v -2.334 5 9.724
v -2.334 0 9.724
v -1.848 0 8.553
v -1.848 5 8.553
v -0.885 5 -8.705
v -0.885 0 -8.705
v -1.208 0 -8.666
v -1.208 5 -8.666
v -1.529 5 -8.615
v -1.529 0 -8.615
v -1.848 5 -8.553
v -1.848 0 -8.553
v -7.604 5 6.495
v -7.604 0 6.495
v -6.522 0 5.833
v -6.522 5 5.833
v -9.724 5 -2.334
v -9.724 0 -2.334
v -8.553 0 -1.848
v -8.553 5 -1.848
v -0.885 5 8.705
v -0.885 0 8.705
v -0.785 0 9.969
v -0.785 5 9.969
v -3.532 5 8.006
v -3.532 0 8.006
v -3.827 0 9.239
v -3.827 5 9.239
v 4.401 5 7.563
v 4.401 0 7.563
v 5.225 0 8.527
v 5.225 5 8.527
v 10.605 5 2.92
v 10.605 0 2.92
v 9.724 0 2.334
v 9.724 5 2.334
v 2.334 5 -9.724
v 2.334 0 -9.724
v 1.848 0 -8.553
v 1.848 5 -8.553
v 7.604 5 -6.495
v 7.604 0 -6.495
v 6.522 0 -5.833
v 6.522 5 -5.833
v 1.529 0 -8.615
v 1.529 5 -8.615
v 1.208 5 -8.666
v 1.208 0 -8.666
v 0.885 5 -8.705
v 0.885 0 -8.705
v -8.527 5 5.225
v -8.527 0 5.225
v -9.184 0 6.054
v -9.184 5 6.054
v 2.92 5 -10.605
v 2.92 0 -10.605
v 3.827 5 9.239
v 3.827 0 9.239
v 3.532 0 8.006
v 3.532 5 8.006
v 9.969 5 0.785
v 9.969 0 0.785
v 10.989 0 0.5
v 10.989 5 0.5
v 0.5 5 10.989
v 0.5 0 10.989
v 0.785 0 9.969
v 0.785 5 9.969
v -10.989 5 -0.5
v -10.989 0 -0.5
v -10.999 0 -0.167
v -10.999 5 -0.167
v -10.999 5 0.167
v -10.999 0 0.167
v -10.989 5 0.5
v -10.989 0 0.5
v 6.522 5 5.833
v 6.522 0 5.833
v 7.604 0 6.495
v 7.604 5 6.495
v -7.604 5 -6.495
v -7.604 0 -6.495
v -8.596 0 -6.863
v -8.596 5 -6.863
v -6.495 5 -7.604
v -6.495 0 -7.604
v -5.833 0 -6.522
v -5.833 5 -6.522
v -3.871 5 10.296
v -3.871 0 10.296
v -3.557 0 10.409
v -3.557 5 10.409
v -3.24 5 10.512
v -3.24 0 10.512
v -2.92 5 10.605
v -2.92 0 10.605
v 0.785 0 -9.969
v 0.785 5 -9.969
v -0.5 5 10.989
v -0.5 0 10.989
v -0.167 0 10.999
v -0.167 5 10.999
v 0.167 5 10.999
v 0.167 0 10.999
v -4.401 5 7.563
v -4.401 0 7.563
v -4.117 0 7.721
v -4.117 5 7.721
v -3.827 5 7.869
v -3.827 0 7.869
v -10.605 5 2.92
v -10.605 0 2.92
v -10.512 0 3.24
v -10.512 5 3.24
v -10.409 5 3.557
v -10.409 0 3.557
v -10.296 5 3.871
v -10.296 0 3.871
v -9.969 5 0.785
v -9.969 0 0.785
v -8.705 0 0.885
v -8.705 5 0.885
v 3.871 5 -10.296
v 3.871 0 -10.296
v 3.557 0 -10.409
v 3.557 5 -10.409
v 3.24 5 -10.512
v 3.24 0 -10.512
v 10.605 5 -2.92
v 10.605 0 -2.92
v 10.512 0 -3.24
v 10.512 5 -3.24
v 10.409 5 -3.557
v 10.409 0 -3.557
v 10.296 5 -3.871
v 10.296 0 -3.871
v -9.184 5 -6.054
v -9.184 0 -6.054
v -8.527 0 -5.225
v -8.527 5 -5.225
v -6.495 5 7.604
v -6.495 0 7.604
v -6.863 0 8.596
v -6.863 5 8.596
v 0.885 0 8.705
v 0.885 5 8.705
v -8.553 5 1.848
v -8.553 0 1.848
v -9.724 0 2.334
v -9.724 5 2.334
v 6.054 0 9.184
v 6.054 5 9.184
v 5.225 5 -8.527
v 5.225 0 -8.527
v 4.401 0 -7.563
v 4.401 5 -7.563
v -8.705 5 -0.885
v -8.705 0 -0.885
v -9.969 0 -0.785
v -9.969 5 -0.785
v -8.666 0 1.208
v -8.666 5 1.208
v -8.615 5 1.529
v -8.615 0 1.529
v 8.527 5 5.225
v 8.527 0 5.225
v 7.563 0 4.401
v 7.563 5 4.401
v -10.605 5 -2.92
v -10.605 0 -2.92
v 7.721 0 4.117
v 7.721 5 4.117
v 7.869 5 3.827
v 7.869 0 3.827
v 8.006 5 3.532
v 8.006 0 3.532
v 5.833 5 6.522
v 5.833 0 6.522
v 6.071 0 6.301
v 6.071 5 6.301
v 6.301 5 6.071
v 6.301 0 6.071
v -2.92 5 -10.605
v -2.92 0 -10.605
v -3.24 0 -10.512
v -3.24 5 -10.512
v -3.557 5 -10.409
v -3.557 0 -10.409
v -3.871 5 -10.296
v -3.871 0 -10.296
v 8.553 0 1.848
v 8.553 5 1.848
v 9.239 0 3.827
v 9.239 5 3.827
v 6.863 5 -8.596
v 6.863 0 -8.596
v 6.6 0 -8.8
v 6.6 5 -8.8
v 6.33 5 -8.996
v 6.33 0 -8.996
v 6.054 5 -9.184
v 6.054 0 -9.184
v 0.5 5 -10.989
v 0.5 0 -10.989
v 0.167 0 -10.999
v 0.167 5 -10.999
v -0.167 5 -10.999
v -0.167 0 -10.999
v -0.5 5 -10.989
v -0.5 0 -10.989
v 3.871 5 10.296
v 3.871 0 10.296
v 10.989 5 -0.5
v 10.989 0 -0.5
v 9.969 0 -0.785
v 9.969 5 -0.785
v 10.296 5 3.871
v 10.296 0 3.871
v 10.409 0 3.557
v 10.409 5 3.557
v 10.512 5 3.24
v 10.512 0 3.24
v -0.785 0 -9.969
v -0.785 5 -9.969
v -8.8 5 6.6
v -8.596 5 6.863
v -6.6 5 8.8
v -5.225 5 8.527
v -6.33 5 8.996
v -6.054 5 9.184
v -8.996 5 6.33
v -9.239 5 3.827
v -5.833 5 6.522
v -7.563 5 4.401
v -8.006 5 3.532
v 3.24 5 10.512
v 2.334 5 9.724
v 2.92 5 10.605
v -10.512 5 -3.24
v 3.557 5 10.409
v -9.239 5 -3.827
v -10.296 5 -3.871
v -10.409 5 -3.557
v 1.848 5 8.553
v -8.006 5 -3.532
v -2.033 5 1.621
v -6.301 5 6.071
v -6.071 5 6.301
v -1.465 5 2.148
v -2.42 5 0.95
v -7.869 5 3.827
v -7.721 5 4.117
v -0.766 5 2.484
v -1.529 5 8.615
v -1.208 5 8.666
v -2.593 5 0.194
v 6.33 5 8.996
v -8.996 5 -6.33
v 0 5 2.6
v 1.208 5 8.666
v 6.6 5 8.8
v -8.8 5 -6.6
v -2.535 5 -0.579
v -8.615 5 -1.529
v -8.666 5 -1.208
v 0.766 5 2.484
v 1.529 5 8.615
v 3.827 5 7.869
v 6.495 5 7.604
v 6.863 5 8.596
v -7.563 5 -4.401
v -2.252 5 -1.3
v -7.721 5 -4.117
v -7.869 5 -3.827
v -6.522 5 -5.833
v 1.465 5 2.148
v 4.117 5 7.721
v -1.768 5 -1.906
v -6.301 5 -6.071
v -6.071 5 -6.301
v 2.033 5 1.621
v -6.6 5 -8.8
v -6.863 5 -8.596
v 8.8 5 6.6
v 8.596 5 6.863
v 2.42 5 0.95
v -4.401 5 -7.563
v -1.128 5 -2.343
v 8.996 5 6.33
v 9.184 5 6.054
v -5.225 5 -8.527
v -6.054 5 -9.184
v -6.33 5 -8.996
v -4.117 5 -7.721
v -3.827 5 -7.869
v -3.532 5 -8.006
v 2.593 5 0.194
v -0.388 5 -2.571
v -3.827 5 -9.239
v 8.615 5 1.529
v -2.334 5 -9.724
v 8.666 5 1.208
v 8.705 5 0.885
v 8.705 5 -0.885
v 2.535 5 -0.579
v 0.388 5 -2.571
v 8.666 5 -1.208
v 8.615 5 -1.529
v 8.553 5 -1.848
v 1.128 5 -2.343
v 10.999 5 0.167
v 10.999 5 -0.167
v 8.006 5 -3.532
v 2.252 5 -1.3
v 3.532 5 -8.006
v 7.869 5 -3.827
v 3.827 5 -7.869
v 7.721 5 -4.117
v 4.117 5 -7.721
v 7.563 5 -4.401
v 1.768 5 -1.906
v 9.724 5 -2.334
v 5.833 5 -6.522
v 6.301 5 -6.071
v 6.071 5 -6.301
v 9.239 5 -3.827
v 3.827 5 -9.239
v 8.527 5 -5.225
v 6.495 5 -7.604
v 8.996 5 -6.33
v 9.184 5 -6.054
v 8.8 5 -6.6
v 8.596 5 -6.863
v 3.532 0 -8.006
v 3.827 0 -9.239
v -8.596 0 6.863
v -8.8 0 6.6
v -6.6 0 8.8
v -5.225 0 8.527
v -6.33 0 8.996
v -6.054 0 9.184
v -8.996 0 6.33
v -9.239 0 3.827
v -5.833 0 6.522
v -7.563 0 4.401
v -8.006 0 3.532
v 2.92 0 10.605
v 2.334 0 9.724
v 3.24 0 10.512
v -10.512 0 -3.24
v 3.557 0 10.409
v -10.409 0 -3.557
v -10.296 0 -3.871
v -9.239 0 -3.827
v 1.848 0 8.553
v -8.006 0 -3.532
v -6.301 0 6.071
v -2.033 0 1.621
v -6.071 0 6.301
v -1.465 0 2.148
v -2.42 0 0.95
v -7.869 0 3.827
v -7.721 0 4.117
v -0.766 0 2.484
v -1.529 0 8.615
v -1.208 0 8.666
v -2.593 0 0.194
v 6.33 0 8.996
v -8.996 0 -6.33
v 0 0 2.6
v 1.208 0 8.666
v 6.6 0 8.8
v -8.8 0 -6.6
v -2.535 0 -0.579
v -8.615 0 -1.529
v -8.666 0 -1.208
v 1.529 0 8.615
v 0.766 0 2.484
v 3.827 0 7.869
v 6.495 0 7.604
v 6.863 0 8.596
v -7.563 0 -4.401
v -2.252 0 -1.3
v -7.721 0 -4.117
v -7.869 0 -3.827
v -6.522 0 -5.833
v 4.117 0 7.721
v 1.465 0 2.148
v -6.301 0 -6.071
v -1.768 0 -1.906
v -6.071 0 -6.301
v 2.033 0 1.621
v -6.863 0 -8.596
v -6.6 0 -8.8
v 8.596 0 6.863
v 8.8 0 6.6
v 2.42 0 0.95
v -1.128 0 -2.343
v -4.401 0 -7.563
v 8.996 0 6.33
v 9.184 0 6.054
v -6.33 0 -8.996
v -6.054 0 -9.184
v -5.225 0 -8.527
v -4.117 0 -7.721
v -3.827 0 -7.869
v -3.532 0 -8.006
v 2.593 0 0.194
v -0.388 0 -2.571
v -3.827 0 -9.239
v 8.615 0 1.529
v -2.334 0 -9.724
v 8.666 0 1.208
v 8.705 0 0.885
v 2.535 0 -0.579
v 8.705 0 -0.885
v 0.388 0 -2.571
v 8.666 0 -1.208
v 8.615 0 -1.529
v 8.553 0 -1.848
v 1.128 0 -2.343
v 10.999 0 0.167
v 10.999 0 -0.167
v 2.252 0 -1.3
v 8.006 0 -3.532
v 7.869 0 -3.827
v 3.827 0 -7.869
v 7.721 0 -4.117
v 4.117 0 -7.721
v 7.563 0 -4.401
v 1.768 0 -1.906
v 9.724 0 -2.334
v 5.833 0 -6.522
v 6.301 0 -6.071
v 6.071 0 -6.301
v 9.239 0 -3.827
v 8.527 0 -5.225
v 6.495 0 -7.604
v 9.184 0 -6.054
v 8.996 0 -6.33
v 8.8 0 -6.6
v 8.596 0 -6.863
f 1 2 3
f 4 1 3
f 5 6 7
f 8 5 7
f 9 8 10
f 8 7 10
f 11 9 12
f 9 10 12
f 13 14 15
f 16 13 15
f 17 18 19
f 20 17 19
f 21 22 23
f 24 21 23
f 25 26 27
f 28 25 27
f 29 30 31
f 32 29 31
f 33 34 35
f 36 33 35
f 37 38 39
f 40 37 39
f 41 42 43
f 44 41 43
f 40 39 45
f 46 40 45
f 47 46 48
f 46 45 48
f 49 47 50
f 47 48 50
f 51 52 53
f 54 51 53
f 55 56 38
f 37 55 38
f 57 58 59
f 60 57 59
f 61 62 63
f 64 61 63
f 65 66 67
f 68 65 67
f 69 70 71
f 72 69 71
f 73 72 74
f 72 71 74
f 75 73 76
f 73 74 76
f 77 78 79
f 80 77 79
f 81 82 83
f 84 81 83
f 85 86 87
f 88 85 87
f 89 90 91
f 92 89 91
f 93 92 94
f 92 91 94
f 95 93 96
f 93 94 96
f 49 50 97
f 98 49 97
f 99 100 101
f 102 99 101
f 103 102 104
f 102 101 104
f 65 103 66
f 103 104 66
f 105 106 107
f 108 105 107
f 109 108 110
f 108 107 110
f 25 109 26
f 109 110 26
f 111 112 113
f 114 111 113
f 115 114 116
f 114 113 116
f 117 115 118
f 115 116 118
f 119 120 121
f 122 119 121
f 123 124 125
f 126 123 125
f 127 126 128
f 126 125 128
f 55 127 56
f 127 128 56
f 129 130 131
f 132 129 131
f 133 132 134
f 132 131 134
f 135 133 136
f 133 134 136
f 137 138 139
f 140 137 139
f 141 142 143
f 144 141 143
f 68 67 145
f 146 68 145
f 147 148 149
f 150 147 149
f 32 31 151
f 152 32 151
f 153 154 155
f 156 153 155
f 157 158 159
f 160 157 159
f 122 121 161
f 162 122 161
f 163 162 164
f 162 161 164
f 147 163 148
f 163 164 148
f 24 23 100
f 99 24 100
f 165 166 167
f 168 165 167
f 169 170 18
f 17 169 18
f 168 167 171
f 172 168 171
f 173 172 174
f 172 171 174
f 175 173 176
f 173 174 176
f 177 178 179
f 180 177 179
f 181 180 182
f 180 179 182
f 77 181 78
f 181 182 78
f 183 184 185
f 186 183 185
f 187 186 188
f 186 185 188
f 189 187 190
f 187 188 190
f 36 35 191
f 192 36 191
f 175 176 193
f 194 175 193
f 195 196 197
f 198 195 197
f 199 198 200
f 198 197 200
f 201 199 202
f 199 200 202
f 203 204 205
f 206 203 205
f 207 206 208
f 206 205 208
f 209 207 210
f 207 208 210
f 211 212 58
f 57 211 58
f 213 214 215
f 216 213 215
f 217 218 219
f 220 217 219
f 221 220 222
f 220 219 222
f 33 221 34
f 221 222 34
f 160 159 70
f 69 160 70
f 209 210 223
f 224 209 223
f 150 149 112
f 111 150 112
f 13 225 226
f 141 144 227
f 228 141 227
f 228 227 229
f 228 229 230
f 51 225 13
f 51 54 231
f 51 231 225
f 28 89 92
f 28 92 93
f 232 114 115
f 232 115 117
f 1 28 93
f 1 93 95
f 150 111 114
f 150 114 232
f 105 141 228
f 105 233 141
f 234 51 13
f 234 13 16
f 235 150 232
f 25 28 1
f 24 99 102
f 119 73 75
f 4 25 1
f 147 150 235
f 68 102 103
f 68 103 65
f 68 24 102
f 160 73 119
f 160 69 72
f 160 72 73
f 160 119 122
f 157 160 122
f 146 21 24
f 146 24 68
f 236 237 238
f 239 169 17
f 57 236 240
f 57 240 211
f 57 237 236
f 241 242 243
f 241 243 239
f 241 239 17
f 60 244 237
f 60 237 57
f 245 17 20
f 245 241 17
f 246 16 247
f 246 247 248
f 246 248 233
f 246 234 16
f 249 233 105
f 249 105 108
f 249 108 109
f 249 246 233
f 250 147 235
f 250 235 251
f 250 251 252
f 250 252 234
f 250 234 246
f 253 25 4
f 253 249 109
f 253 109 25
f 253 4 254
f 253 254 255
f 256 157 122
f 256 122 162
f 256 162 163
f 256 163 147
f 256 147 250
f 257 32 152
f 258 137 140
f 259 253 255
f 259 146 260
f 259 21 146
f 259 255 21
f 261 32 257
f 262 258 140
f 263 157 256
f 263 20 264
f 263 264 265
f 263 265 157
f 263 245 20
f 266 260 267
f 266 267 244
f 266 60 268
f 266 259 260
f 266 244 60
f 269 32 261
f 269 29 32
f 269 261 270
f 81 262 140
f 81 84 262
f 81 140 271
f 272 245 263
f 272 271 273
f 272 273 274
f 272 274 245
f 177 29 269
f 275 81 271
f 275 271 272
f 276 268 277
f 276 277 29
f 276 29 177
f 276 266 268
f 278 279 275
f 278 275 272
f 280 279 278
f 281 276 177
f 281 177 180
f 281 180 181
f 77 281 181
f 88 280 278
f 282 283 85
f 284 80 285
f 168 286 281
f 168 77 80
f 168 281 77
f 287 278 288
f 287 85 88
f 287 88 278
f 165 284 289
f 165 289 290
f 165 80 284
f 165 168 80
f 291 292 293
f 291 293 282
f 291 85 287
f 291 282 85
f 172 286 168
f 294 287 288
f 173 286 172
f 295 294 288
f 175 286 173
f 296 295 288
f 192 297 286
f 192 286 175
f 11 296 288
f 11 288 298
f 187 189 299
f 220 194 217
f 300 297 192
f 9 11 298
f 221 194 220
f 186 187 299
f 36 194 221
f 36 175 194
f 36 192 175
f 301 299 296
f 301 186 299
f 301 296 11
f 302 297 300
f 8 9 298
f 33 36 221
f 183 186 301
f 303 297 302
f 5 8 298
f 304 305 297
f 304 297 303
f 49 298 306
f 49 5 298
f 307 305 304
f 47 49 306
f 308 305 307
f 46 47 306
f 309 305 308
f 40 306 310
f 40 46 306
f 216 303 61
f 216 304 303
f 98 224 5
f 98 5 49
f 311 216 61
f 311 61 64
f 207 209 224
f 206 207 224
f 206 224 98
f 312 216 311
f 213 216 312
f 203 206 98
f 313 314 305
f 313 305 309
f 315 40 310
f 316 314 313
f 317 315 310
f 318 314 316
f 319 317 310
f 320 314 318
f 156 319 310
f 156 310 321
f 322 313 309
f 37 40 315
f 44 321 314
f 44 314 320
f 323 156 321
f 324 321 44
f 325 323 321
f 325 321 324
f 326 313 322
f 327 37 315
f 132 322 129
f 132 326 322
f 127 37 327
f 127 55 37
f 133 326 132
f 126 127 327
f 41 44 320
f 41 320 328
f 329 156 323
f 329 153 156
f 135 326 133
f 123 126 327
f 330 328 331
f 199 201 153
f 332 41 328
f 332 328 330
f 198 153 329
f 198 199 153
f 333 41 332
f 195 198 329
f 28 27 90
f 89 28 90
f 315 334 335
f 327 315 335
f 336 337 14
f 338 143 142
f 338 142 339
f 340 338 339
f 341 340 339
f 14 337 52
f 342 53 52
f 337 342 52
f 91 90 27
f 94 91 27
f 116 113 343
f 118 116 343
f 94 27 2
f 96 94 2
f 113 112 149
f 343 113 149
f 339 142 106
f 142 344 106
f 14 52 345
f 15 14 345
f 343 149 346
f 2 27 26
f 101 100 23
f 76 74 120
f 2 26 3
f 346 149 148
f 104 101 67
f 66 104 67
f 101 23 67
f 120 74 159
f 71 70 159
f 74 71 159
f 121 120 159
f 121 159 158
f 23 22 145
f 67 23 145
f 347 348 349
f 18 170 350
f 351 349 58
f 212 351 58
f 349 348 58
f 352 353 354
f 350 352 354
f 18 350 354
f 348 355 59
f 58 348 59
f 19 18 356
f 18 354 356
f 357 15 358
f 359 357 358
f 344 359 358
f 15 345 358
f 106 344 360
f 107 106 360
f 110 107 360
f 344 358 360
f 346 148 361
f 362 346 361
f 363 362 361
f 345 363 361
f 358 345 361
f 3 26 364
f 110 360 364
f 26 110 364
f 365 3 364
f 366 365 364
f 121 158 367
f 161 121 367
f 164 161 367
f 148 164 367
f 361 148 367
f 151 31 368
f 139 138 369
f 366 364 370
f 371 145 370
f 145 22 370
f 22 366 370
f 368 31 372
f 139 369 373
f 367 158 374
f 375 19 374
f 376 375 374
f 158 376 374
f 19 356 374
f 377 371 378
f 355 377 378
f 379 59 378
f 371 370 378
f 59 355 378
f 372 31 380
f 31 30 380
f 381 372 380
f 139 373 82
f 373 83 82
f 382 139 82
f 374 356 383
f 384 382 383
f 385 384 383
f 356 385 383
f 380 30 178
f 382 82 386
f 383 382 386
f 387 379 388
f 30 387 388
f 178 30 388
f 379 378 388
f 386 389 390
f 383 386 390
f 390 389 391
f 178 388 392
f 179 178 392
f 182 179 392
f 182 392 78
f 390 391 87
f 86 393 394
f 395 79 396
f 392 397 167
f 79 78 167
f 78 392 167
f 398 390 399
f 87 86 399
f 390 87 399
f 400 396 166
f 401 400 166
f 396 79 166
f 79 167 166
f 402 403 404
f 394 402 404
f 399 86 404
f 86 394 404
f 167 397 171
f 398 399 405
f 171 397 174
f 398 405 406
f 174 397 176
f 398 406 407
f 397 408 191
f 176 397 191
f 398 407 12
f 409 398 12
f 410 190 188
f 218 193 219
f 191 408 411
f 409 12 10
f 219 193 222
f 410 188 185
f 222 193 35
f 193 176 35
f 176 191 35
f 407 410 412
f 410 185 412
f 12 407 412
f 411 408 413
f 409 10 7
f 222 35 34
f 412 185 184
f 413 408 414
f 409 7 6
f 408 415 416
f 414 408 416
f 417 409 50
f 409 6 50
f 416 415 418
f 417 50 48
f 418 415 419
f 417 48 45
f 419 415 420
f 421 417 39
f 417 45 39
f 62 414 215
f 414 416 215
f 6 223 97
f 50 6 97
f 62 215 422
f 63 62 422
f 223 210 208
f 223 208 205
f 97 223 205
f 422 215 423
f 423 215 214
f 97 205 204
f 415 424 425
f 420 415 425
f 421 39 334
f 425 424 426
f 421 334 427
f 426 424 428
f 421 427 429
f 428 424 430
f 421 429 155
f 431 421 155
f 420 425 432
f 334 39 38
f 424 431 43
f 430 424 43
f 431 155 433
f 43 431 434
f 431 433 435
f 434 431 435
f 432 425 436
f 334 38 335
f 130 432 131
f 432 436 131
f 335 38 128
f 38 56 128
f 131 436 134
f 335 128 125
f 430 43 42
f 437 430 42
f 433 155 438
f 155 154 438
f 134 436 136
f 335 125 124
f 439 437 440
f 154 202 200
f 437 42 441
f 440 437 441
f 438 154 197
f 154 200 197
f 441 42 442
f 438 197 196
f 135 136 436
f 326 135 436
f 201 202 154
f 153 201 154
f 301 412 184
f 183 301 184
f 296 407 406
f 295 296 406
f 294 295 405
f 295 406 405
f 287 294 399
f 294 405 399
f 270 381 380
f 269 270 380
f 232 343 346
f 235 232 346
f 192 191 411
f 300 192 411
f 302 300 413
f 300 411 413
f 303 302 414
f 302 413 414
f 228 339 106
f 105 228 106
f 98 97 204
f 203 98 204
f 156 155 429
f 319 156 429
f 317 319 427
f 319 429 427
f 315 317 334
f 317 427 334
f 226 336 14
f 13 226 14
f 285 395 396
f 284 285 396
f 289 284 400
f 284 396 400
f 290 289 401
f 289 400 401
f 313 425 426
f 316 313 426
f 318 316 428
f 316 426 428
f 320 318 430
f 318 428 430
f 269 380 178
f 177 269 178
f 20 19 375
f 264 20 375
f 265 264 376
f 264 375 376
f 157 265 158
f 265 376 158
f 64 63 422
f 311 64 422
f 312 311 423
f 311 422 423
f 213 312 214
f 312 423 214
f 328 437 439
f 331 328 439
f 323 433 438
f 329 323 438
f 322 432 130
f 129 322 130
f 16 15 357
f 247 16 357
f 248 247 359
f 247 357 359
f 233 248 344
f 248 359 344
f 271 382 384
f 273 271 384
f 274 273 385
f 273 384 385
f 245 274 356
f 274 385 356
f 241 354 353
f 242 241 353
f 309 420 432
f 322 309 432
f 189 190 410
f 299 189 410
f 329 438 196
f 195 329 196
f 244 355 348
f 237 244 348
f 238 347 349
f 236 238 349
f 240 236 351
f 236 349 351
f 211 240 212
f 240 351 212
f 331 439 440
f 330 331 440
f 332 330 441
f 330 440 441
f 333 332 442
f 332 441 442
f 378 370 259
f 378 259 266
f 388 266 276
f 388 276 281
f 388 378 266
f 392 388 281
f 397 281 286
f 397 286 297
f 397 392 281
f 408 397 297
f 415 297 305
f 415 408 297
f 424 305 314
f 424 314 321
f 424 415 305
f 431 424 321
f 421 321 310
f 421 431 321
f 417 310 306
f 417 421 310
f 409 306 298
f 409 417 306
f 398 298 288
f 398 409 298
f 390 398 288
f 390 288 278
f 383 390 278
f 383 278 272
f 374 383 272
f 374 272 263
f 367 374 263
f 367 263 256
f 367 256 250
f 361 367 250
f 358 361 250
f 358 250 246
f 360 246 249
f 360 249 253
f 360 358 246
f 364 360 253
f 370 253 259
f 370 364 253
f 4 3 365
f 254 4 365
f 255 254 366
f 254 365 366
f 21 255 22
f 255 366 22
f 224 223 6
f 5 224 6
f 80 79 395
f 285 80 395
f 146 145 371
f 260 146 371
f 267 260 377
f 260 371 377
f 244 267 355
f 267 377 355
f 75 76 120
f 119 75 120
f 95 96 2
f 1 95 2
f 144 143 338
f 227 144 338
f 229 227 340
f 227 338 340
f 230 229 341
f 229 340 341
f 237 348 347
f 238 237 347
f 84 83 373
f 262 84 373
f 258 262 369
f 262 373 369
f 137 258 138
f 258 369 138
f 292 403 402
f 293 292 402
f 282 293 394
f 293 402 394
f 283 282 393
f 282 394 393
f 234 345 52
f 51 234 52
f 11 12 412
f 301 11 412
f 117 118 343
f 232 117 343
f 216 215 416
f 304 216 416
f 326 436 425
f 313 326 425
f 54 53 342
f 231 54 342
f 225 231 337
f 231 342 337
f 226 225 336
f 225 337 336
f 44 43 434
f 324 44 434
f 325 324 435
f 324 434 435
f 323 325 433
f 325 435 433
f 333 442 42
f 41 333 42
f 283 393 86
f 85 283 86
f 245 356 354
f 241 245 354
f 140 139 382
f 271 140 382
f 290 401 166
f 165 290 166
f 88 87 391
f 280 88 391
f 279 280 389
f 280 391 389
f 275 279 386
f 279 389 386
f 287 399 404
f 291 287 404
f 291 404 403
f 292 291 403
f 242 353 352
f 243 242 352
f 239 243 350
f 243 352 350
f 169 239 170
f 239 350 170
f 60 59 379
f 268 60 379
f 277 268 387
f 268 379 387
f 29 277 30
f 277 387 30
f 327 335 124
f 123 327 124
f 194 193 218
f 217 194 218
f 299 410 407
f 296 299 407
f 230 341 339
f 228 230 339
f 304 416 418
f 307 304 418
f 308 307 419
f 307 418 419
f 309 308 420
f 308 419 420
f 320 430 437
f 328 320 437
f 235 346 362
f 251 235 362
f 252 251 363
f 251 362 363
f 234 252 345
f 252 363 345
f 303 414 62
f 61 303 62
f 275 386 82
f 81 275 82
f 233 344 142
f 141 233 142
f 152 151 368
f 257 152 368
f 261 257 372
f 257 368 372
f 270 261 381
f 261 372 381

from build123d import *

# Parameters (mm, degrees)
SKETCH1_R           = 2.6
BOSS_EXTRUDE1_DEPTH = 5


with BuildPart() as part:
    # Sketch1 → Boss-Extrude1 (new body)
    with BuildSketch(Plane(origin=(0, 0, 0), x_dir=(1, 0, 0), z_dir=(0, 1, 0))):
        with BuildLine():
            Line((0.885, 8.705129235), (0.785, 9.969141137))
            Line((0.785, 9.969141137), (0.5, 10.988630488))
            ThreePointArc((0.5, 10.988630488), (0, 11), (-0.5, 10.988630488))
            Line((-0.5, 10.988630488), (-0.785, 9.969141137))
            Line((-0.785, 9.969141137), (-0.885, 8.705129235))
            ThreePointArc((-0.885, 8.705129235), (-1.368801569, 8.64227298), (-1.848347855, 8.552549924))
            Line((-1.848347855, 8.552549924), (-2.334054665, 9.72379498))
            Line((-2.334054665, 9.72379498), (-2.920145308, 10.605317128))
            ThreePointArc((-2.920145308, 10.605317128), (-3.399186938, 10.461621679), (-3.871201824, 10.296300134))
            Line((-3.871201824, 10.296300134), (-3.827213396, 9.238638299))
            Line((-3.827213396, 9.238638299), (-3.531717889, 8.005589844))
            ThreePointArc((-3.531717889, 8.005589844), (-3.972416873, 7.796307087), (-4.400766544, 7.562787438))
            Line((-4.400766544, 7.562787438), (-5.224635797, 8.526616022))
            Line((-5.224635797, 8.526616022), (-6.054446447, 9.183881436))
            ThreePointArc((-6.054446447, 9.183881436), (-6.465637775, 8.899186938), (-6.863463441, 8.596096183))
            Line((-6.863463441, 8.596096183), (-6.494792479, 7.603793176))
            Line((-6.494792479, 7.603793176), (-5.832726624, 6.522407541))
            ThreePointArc((-5.832726624, 6.522407541), (-6.187184335, 6.187184335), (-6.522407541, 5.832726624))
            Line((-6.522407541, 5.832726624), (-7.603793176, 6.494792479))
            Line((-7.603793176, 6.494792479), (-8.596096183, 6.863463441))
            ThreePointArc((-8.596096183, 6.863463441), (-8.899186938, 6.465637775), (-9.183881436, 6.054446447))
            Line((-9.183881436, 6.054446447), (-8.526616022, 5.224635797))
            Line((-8.526616022, 5.224635797), (-7.562787438, 4.400766544))
            ThreePointArc((-7.562787438, 4.400766544), (-7.796307087, 3.972416873), (-8.005589844, 3.531717889))
            Line((-8.005589844, 3.531717889), (-9.238638299, 3.827213396))
            Line((-9.238638299, 3.827213396), (-10.296300134, 3.871201824))
            ThreePointArc((-10.296300134, 3.871201824), (-10.461621679, 3.399186938), (-10.605317128, 2.920145308))
            Line((-10.605317128, 2.920145308), (-9.72379498, 2.334054665))
            Line((-9.72379498, 2.334054665), (-8.552549924, 1.848347855))
            ThreePointArc((-8.552549924, 1.848347855), (-8.64227298, 1.368801569), (-8.705129235, 0.885))
            Line((-8.705129235, 0.885), (-9.969141137, 0.785))
            Line((-9.969141137, 0.785), (-10.988630488, 0.5))
            ThreePointArc((-10.988630488, 0.5), (-11, 0), (-10.988630488, -0.5))
            Line((-10.988630488, -0.5), (-9.969141137, -0.785))
            Line((-9.969141137, -0.785), (-8.705129235, -0.885))
            ThreePointArc((-8.705129235, -0.885), (-8.64227298, -1.368801569), (-8.552549924, -1.848347855))
            Line((-8.552549924, -1.848347855), (-9.72379498, -2.334054665))
            Line((-9.72379498, -2.334054665), (-10.605317128, -2.920145308))
            ThreePointArc((-10.605317128, -2.920145308), (-10.461621679, -3.399186938), (-10.296300134, -3.871201824))
            Line((-10.296300134, -3.871201824), (-9.238638299, -3.827213396))
            Line((-9.238638299, -3.827213396), (-8.005589844, -3.531717889))
            ThreePointArc((-8.005589844, -3.531717889), (-7.796307087, -3.972416873), (-7.562787438, -4.400766544))
            Line((-7.562787438, -4.400766544), (-8.526616022, -5.224635797))
            Line((-8.526616022, -5.224635797), (-9.183881436, -6.054446447))
            ThreePointArc((-9.183881436, -6.054446447), (-8.899186938, -6.465637775), (-8.596096183, -6.863463441))
            Line((-8.596096183, -6.863463441), (-7.603793176, -6.494792479))
            Line((-7.603793176, -6.494792479), (-6.522407541, -5.832726624))
            ThreePointArc((-6.522407541, -5.832726624), (-6.187184335, -6.187184335), (-5.832726624, -6.522407541))
            Line((-5.832726624, -6.522407541), (-6.494792479, -7.603793176))
            Line((-6.494792479, -7.603793176), (-6.863463441, -8.596096183))
            ThreePointArc((-6.863463441, -8.596096183), (-6.465637775, -8.899186938), (-6.054446447, -9.183881436))
            Line((-6.054446447, -9.183881436), (-5.224635797, -8.526616022))
            Line((-5.224635797, -8.526616022), (-4.400766544, -7.562787438))
            ThreePointArc((-4.400766544, -7.562787438), (-3.972416873, -7.796307087), (-3.531717889, -8.005589844))
            Line((-3.531717889, -8.005589844), (-3.827213396, -9.238638299))
            Line((-3.827213396, -9.238638299), (-3.871201824, -10.296300134))
            ThreePointArc((-3.871201824, -10.296300134), (-3.399186938, -10.461621679), (-2.920145308, -10.605317128))
            Line((-2.920145308, -10.605317128), (-2.334054665, -9.72379498))
            Line((-2.334054665, -9.72379498), (-1.848347855, -8.552549924))
            ThreePointArc((-1.848347855, -8.552549924), (-1.368801569, -8.64227298), (-0.885, -8.705129235))
            Line((-0.885, -8.705129235), (-0.785, -9.969141137))
            Line((-0.785, -9.969141137), (-0.5, -10.988630488))
            ThreePointArc((-0.5, -10.988630488), (0, -11), (0.5, -10.988630488))
            Line((0.5, -10.988630488), (0.785, -9.969141137))
            Line((0.785, -9.969141137), (0.885, -8.705129235))
            ThreePointArc((0.885, -8.705129235), (1.368801569, -8.64227298), (1.848347855, -8.552549924))
            Line((1.848347855, -8.552549924), (2.334054665, -9.72379498))
            Line((2.334054665, -9.72379498), (2.920145308, -10.605317128))
            ThreePointArc((2.920145308, -10.605317128), (3.399186938, -10.461621679), (3.871201824, -10.296300134))
            Line((3.871201824, -10.296300134), (3.827213396, -9.238638299))
            Line((3.827213396, -9.238638299), (3.531717889, -8.005589844))
            ThreePointArc((3.531717889, -8.005589844), (3.972416873, -7.796307087), (4.400766544, -7.562787438))
            Line((4.400766544, -7.562787438), (5.224635797, -8.526616022))
            Line((5.224635797, -8.526616022), (6.054446447, -9.183881436))
            ThreePointArc((6.054446447, -9.183881436), (6.465637775, -8.899186938), (6.863463441, -8.596096183))
            Line((6.863463441, -8.596096183), (6.494792479, -7.603793176))
            Line((6.494792479, -7.603793176), (5.832726624, -6.522407541))
            ThreePointArc((5.832726624, -6.522407541), (6.187184335, -6.187184335), (6.522407541, -5.832726624))
            Line((6.522407541, -5.832726624), (7.603793176, -6.494792479))
            Line((7.603793176, -6.494792479), (8.596096183, -6.863463441))
            ThreePointArc((8.596096183, -6.863463441), (8.899186938, -6.465637775), (9.183881436, -6.054446447))
            Line((9.183881436, -6.054446447), (8.526616022, -5.224635797))
            Line((8.526616022, -5.224635797), (7.562787438, -4.400766544))
            ThreePointArc((7.562787438, -4.400766544), (7.796307087, -3.972416873), (8.005589844, -3.531717889))
            Line((8.005589844, -3.531717889), (9.238638299, -3.827213396))
            Line((9.238638299, -3.827213396), (10.296300134, -3.871201824))
            ThreePointArc((10.296300134, -3.871201824), (10.461621679, -3.399186938), (10.605317128, -2.920145308))
            Line((10.605317128, -2.920145308), (9.72379498, -2.334054665))
            Line((9.72379498, -2.334054665), (8.552549924, -1.848347855))
            ThreePointArc((8.552549924, -1.848347855), (8.64227298, -1.368801569), (8.705129235, -0.885))
            Line((8.705129235, -0.885), (9.969141137, -0.785))
            Line((9.969141137, -0.785), (10.988630488, -0.5))
            ThreePointArc((10.988630488, -0.5), (11, 0), (10.988630488, 0.5))
            Line((10.988630488, 0.5), (9.969141137, 0.785))
            Line((9.969141137, 0.785), (8.705129235, 0.885))
            ThreePointArc((8.705129235, 0.885), (8.64227298, 1.368801569), (8.552549924, 1.848347855))
            Line((8.552549924, 1.848347855), (9.72379498, 2.334054665))
            Line((9.72379498, 2.334054665), (10.605317128, 2.920145308))
            ThreePointArc((10.605317128, 2.920145308), (10.461621679, 3.399186938), (10.296300134, 3.871201824))
            Line((10.296300134, 3.871201824), (9.238638299, 3.827213396))
            Line((9.238638299, 3.827213396), (8.005589844, 3.531717889))
            ThreePointArc((8.005589844, 3.531717889), (7.796307087, 3.972416873), (7.562787438, 4.400766544))
            Line((7.562787438, 4.400766544), (8.526616022, 5.224635797))
            Line((8.526616022, 5.224635797), (9.183881436, 6.054446447))
            ThreePointArc((9.183881436, 6.054446447), (8.899186938, 6.465637775), (8.596096183, 6.863463441))
            Line((8.596096183, 6.863463441), (7.603793176, 6.494792479))
            Line((7.603793176, 6.494792479), (6.522407541, 5.832726624))
            ThreePointArc((6.522407541, 5.832726624), (6.187184335, 6.187184335), (5.832726624, 6.522407541))
            Line((5.832726624, 6.522407541), (6.494792479, 7.603793176))
            Line((6.494792479, 7.603793176), (6.863463441, 8.596096183))
            ThreePointArc((6.863463441, 8.596096183), (6.465637775, 8.899186938), (6.054446447, 9.183881436))
            Line((6.054446447, 9.183881436), (5.224635797, 8.526616022))
            Line((5.224635797, 8.526616022), (4.400766544, 7.562787438))
            ThreePointArc((4.400766544, 7.562787438), (3.972416873, 7.796307087), (3.531717889, 8.005589844))
            Line((3.531717889, 8.005589844), (3.827213396, 9.238638299))
            Line((3.827213396, 9.238638299), (3.871201824, 10.296300134))
            ThreePointArc((3.871201824, 10.296300134), (3.399186938, 10.461621679), (2.920145308, 10.605317128))
            Line((2.920145308, 10.605317128), (2.334054665, 9.72379498))
            Line((2.334054665, 9.72379498), (1.848347855, 8.552549924))
            ThreePointArc((1.848347855, 8.552549924), (1.368801569, 8.64227298), (0.885, 8.705129235))
        make_face()
        with Locations(Location((0, 0, 0), (0, 0, 270))):
            Circle(SKETCH1_R, mode=Mode.SUBTRACT)
    extrude(amount=BOSS_EXTRUDE1_DEPTH)


solid = part.part
